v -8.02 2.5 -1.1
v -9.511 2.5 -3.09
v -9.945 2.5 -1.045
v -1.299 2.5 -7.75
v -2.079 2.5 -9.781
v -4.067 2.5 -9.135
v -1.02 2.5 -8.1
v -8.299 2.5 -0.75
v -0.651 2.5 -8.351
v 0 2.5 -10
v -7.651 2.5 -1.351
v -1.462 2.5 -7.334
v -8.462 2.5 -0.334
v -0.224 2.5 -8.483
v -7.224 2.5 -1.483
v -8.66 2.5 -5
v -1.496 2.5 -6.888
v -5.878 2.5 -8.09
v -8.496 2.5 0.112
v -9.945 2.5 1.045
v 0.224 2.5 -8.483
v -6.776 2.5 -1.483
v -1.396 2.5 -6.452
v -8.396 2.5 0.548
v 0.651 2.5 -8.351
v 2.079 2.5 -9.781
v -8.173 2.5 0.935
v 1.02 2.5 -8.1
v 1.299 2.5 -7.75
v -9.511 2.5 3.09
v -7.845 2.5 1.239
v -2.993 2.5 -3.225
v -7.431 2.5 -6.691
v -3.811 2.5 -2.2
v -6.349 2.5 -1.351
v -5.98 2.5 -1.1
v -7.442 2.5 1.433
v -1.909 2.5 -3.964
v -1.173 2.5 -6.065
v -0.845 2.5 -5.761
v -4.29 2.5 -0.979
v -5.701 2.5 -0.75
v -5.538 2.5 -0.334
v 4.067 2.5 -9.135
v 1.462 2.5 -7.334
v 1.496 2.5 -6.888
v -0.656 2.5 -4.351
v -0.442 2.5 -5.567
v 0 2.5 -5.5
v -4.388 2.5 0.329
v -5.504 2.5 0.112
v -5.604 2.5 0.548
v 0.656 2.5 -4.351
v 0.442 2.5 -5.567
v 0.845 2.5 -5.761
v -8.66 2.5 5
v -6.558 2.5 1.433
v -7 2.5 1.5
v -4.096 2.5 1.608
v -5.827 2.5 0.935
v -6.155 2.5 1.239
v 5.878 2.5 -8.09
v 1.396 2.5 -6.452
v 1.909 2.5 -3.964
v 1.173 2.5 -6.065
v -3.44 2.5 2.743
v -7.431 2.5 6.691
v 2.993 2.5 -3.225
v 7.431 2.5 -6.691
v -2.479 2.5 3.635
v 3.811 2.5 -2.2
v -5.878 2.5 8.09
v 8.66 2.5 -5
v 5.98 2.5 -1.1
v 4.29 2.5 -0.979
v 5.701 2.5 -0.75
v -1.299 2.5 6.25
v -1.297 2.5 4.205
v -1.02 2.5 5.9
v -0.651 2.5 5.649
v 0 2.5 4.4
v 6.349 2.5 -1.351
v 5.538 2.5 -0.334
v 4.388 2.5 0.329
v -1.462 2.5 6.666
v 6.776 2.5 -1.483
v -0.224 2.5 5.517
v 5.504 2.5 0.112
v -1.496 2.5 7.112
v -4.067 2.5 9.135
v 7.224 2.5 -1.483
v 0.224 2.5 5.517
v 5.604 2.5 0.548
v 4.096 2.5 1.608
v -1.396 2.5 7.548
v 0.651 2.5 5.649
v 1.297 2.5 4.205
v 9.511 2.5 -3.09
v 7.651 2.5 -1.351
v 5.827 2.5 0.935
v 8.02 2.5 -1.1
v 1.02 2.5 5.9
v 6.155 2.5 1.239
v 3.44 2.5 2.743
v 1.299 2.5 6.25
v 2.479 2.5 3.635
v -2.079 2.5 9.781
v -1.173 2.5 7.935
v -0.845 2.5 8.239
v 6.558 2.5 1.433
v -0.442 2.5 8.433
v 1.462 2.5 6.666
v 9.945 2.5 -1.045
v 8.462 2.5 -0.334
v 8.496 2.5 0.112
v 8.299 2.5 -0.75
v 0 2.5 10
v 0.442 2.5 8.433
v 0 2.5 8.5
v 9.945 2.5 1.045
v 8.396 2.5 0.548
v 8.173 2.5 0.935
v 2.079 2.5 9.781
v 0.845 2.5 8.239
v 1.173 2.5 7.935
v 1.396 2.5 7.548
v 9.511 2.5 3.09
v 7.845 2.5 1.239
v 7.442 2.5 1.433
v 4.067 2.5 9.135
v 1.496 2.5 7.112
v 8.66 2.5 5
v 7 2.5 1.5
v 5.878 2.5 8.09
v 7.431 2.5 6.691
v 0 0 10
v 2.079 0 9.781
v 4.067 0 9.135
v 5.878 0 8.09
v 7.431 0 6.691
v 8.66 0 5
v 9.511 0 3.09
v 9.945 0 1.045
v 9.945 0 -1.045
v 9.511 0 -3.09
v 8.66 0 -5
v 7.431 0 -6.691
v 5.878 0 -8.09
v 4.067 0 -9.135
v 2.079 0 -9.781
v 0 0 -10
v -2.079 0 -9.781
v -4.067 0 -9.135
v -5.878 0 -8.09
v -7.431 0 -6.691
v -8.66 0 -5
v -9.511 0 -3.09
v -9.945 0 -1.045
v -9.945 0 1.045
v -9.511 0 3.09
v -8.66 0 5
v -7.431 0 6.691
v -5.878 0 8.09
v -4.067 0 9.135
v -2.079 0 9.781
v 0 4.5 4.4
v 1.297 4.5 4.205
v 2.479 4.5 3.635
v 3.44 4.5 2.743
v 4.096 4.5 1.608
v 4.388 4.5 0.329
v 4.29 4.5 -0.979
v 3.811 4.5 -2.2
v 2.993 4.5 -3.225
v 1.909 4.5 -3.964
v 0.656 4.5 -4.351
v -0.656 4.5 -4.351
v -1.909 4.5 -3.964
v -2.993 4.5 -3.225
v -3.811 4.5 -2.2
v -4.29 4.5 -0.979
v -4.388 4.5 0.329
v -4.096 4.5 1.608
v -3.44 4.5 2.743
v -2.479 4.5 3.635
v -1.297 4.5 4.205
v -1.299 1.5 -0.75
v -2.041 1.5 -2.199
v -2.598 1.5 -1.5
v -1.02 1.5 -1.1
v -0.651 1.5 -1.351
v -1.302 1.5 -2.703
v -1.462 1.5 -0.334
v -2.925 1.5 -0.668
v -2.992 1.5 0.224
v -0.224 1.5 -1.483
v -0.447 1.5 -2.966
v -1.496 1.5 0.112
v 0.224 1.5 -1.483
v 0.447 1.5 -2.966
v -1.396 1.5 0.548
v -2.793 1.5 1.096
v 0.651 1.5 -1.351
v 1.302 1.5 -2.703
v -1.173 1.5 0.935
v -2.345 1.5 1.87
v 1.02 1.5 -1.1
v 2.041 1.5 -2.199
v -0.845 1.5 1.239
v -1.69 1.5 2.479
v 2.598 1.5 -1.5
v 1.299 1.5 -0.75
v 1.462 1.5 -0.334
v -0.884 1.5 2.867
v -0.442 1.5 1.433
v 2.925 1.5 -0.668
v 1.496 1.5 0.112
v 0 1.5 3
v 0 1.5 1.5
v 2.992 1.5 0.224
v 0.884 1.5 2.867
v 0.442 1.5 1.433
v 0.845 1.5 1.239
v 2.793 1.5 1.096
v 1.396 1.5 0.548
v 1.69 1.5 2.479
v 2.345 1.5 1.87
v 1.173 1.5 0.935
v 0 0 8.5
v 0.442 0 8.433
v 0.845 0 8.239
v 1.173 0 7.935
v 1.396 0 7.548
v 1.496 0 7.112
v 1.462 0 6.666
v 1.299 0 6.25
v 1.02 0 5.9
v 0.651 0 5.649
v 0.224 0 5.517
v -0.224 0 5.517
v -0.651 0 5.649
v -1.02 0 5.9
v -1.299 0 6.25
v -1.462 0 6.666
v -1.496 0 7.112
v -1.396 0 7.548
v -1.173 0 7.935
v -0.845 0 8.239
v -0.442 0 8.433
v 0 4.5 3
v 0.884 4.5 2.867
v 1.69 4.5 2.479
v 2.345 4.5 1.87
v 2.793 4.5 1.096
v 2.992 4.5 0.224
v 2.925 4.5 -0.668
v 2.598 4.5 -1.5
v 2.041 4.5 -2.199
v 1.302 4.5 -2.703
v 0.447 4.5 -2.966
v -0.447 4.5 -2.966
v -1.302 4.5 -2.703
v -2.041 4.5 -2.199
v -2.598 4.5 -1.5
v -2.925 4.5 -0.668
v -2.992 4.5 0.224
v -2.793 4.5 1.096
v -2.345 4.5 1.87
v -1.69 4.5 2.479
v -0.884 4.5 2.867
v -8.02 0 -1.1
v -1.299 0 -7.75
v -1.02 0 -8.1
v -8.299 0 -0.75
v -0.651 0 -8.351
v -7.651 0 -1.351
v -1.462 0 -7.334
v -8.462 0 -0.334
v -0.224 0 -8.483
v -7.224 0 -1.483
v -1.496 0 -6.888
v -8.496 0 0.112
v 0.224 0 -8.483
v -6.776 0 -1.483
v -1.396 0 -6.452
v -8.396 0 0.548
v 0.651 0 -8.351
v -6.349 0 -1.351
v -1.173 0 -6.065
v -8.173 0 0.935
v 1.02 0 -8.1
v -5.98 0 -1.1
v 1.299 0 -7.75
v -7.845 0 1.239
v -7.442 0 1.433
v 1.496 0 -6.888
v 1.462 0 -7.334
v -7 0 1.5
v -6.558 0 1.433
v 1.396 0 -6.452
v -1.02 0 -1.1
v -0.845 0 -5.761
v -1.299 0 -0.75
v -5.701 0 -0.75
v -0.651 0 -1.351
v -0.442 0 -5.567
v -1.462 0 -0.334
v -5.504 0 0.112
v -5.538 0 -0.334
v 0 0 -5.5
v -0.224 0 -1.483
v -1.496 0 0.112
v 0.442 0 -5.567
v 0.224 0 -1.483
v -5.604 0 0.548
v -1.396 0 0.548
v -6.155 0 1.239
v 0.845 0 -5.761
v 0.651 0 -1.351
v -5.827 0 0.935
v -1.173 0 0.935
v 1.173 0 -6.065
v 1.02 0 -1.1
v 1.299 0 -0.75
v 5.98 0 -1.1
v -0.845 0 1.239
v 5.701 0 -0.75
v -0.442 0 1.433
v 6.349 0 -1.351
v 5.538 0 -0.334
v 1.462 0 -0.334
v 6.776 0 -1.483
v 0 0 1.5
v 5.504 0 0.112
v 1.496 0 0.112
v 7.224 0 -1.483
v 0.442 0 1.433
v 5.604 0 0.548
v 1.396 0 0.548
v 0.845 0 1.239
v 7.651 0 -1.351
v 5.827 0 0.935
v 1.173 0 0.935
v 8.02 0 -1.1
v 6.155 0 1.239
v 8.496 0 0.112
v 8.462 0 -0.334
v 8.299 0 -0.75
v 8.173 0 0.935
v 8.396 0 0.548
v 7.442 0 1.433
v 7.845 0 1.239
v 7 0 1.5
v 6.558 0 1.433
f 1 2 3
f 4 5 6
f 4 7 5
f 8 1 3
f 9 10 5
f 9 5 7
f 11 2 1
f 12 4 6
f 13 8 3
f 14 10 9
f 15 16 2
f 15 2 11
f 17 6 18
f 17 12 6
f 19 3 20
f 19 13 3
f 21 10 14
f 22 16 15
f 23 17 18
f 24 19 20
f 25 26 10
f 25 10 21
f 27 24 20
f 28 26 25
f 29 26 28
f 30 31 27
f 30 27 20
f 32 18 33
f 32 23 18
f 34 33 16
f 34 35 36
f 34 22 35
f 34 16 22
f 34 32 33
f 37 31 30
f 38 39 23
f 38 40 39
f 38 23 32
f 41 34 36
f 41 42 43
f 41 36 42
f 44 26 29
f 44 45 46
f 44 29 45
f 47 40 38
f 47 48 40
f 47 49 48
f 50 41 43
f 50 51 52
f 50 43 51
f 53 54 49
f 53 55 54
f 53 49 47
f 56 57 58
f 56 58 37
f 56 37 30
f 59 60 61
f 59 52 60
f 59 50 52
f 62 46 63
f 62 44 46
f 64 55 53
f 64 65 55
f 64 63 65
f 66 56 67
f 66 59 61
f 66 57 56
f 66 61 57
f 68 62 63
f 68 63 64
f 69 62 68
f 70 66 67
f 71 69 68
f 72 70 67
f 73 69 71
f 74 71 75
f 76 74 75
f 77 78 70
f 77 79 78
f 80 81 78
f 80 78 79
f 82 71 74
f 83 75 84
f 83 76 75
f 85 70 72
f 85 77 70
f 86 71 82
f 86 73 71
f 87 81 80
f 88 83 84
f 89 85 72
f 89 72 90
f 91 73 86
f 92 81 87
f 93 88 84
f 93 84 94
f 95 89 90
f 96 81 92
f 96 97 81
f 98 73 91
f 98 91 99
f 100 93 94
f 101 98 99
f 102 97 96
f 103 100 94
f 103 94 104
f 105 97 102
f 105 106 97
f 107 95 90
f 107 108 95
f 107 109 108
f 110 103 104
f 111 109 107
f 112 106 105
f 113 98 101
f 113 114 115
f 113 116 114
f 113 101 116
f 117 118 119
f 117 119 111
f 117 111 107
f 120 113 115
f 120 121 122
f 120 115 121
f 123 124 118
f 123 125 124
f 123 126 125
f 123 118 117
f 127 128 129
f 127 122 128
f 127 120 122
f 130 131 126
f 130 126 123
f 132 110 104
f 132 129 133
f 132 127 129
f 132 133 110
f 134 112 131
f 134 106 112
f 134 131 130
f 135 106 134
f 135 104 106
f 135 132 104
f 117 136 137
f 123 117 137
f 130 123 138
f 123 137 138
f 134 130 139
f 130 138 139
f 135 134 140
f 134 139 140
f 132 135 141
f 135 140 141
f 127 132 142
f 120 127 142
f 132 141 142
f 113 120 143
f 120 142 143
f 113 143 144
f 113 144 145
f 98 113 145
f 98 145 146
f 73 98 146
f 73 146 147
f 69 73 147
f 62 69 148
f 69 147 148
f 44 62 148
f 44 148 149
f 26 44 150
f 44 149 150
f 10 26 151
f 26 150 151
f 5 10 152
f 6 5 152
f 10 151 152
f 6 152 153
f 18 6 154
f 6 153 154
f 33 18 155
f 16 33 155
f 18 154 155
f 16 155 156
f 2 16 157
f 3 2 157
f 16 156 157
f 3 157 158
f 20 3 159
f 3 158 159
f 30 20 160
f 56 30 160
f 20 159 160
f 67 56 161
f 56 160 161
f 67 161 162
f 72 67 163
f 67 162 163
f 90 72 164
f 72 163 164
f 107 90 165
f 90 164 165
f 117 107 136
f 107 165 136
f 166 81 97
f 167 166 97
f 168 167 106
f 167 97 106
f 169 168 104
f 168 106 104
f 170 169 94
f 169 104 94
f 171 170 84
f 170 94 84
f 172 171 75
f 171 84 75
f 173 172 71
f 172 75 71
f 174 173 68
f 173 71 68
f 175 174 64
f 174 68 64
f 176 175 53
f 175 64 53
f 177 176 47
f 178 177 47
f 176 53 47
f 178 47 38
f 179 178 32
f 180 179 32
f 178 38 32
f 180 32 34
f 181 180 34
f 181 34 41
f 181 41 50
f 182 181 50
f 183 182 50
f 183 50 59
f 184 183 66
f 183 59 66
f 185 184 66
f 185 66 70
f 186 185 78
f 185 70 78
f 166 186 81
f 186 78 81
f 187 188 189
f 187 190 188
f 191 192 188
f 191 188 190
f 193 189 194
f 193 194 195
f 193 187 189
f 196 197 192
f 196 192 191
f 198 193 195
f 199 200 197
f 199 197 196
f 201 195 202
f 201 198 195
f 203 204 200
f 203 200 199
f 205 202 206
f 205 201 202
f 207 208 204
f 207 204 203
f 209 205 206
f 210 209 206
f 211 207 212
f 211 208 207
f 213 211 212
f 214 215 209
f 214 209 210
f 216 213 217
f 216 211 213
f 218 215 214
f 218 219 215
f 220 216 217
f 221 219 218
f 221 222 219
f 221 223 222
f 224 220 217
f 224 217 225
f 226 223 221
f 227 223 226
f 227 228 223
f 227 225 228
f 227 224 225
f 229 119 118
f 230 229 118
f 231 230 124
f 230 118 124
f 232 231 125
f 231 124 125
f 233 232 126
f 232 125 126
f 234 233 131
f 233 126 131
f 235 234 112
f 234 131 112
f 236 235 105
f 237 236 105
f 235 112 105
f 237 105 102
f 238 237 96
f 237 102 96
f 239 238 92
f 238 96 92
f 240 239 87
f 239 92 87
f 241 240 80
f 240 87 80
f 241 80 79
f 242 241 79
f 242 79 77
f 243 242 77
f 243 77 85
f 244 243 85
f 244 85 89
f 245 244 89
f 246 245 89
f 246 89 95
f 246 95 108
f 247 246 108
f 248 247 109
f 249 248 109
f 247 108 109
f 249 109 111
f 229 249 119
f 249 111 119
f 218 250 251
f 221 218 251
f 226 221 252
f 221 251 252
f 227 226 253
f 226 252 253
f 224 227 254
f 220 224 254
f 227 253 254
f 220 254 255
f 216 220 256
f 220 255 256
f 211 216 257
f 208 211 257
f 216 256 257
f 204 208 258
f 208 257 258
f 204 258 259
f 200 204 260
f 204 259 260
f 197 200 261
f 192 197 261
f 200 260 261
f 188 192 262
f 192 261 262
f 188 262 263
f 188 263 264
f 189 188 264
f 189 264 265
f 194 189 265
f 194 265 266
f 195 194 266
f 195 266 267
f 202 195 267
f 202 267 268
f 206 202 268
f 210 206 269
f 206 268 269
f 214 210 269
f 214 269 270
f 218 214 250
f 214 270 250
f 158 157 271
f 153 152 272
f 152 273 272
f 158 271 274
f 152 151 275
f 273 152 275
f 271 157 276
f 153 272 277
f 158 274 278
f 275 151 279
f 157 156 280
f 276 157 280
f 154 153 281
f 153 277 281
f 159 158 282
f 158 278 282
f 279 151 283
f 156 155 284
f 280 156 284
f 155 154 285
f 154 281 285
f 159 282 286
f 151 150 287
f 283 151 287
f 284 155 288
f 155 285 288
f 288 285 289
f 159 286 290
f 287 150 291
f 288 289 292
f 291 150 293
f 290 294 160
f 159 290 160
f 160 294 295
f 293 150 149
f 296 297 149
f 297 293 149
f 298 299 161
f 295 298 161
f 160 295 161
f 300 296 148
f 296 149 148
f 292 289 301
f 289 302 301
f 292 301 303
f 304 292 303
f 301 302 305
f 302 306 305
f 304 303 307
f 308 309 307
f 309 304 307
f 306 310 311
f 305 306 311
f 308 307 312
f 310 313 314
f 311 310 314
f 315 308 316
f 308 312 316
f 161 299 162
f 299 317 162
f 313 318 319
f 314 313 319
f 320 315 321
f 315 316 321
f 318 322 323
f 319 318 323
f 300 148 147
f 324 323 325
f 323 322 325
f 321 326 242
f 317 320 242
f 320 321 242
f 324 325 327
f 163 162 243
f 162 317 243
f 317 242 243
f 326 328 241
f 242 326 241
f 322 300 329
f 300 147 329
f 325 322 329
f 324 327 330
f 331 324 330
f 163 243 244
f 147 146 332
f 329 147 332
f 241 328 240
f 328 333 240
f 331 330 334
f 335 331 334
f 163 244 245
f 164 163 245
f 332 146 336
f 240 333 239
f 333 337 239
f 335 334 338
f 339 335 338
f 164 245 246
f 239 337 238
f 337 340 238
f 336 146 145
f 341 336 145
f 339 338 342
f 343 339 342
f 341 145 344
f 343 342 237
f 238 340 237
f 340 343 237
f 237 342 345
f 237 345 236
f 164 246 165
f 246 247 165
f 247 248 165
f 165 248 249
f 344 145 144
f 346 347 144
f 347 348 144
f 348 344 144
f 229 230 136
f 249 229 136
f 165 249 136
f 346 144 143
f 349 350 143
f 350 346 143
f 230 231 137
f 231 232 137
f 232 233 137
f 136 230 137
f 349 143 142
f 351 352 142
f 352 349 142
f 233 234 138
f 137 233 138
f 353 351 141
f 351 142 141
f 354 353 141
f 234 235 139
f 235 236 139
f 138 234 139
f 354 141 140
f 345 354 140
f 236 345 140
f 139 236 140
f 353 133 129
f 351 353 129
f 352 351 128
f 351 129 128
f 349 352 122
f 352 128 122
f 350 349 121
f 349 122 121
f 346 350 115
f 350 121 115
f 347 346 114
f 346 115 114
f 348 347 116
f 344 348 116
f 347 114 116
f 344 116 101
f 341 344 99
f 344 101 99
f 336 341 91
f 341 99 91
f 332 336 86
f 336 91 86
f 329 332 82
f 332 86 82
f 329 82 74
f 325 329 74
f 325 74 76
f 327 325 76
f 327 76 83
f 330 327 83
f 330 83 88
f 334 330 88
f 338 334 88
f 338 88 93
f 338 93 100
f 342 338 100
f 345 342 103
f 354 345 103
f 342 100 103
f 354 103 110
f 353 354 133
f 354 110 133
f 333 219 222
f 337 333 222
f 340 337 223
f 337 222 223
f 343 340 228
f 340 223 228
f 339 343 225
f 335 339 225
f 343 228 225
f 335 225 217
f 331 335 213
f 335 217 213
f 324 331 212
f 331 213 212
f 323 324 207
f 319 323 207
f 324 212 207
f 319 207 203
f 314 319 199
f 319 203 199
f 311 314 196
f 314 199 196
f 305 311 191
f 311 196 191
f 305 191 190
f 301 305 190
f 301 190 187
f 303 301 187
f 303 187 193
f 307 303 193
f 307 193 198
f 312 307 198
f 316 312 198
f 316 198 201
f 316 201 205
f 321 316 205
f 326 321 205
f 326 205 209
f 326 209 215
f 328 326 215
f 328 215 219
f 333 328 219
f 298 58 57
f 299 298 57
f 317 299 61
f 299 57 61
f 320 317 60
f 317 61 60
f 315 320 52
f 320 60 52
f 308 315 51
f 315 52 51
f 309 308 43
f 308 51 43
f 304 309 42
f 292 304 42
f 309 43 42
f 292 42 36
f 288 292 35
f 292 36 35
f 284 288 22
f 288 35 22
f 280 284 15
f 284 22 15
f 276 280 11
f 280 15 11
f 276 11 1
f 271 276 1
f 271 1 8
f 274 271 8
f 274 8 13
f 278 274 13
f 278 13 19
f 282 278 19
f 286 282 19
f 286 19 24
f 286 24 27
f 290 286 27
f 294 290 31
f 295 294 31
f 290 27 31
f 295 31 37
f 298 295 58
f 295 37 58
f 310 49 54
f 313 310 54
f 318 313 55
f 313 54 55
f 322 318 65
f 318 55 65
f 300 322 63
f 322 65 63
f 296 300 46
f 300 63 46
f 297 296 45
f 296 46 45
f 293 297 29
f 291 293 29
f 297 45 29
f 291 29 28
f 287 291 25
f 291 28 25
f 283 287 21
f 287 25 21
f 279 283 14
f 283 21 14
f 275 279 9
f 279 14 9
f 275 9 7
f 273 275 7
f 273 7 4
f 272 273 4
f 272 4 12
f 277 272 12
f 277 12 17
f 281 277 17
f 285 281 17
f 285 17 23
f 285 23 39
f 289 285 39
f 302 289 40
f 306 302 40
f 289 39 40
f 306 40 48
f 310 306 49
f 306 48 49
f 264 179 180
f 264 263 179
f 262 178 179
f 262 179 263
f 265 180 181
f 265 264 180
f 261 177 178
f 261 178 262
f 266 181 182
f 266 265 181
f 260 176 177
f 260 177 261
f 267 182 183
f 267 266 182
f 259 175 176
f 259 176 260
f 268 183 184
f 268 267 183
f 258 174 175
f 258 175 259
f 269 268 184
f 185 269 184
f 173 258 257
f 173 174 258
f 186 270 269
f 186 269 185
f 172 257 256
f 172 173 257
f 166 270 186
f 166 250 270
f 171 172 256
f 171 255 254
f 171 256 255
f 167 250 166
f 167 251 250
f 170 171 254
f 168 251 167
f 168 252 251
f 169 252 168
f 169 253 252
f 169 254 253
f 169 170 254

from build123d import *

# Parameters (mm, degrees)
SKETCH_4_R           = 10
EXTRUDE_2_DEPTH      = 2.5
SKETCH_6_R           = 1.5
CUT_EXTRUDE_9_DEPTH  = 2.5
SKETCH_7_R           = 4.4
EXTRUDE_3_DEPTH      = 2
SKETCH_8_R           = 3
CUT_EXTRUDE_10_DEPTH = 3


with BuildPart() as part:
    # 草图4 → 凸台-拉伸2 (new body)
    with BuildSketch(Plane(origin=(0, 0, 0), x_dir=(1, 0, 0), z_dir=(0, 1, 0))):
        Circle(SKETCH_4_R)
    extrude(amount=EXTRUDE_2_DEPTH)

    # 草图6 → 切除-拉伸9 (cut)
    with BuildSketch(Plane(origin=(0, 2.5, 0), x_dir=(1, 0, 0), z_dir=(0, 1, 0))):
        with Locations((0, 7)):
            Circle(SKETCH_6_R)
        Circle(SKETCH_6_R)
        with Locations((7, 0)):
            Circle(SKETCH_6_R)
        with Locations((-7, 0)):
            Circle(SKETCH_6_R)
        with Locations((0, -7)):
            Circle(SKETCH_6_R)
    extrude(amount=-CUT_EXTRUDE_9_DEPTH, mode=Mode.SUBTRACT)

    # 草图7 → 凸台-拉伸3 (add)
    with BuildSketch(Plane(origin=(0, 2.5, 0), x_dir=(1, 0, 0), z_dir=(0, 1, 0))):
        Circle(SKETCH_7_R)
    extrude(amount=EXTRUDE_3_DEPTH)

    # 草图8 → 切除-拉伸10 (cut)
    with BuildSketch(Plane(origin=(0, 4.5, 0), x_dir=(1, 0, 0), z_dir=(0, 1, 0))):
        Circle(SKETCH_8_R)
    extrude(amount=-CUT_EXTRUDE_10_DEPTH, mode=Mode.SUBTRACT)


solid = part.part
